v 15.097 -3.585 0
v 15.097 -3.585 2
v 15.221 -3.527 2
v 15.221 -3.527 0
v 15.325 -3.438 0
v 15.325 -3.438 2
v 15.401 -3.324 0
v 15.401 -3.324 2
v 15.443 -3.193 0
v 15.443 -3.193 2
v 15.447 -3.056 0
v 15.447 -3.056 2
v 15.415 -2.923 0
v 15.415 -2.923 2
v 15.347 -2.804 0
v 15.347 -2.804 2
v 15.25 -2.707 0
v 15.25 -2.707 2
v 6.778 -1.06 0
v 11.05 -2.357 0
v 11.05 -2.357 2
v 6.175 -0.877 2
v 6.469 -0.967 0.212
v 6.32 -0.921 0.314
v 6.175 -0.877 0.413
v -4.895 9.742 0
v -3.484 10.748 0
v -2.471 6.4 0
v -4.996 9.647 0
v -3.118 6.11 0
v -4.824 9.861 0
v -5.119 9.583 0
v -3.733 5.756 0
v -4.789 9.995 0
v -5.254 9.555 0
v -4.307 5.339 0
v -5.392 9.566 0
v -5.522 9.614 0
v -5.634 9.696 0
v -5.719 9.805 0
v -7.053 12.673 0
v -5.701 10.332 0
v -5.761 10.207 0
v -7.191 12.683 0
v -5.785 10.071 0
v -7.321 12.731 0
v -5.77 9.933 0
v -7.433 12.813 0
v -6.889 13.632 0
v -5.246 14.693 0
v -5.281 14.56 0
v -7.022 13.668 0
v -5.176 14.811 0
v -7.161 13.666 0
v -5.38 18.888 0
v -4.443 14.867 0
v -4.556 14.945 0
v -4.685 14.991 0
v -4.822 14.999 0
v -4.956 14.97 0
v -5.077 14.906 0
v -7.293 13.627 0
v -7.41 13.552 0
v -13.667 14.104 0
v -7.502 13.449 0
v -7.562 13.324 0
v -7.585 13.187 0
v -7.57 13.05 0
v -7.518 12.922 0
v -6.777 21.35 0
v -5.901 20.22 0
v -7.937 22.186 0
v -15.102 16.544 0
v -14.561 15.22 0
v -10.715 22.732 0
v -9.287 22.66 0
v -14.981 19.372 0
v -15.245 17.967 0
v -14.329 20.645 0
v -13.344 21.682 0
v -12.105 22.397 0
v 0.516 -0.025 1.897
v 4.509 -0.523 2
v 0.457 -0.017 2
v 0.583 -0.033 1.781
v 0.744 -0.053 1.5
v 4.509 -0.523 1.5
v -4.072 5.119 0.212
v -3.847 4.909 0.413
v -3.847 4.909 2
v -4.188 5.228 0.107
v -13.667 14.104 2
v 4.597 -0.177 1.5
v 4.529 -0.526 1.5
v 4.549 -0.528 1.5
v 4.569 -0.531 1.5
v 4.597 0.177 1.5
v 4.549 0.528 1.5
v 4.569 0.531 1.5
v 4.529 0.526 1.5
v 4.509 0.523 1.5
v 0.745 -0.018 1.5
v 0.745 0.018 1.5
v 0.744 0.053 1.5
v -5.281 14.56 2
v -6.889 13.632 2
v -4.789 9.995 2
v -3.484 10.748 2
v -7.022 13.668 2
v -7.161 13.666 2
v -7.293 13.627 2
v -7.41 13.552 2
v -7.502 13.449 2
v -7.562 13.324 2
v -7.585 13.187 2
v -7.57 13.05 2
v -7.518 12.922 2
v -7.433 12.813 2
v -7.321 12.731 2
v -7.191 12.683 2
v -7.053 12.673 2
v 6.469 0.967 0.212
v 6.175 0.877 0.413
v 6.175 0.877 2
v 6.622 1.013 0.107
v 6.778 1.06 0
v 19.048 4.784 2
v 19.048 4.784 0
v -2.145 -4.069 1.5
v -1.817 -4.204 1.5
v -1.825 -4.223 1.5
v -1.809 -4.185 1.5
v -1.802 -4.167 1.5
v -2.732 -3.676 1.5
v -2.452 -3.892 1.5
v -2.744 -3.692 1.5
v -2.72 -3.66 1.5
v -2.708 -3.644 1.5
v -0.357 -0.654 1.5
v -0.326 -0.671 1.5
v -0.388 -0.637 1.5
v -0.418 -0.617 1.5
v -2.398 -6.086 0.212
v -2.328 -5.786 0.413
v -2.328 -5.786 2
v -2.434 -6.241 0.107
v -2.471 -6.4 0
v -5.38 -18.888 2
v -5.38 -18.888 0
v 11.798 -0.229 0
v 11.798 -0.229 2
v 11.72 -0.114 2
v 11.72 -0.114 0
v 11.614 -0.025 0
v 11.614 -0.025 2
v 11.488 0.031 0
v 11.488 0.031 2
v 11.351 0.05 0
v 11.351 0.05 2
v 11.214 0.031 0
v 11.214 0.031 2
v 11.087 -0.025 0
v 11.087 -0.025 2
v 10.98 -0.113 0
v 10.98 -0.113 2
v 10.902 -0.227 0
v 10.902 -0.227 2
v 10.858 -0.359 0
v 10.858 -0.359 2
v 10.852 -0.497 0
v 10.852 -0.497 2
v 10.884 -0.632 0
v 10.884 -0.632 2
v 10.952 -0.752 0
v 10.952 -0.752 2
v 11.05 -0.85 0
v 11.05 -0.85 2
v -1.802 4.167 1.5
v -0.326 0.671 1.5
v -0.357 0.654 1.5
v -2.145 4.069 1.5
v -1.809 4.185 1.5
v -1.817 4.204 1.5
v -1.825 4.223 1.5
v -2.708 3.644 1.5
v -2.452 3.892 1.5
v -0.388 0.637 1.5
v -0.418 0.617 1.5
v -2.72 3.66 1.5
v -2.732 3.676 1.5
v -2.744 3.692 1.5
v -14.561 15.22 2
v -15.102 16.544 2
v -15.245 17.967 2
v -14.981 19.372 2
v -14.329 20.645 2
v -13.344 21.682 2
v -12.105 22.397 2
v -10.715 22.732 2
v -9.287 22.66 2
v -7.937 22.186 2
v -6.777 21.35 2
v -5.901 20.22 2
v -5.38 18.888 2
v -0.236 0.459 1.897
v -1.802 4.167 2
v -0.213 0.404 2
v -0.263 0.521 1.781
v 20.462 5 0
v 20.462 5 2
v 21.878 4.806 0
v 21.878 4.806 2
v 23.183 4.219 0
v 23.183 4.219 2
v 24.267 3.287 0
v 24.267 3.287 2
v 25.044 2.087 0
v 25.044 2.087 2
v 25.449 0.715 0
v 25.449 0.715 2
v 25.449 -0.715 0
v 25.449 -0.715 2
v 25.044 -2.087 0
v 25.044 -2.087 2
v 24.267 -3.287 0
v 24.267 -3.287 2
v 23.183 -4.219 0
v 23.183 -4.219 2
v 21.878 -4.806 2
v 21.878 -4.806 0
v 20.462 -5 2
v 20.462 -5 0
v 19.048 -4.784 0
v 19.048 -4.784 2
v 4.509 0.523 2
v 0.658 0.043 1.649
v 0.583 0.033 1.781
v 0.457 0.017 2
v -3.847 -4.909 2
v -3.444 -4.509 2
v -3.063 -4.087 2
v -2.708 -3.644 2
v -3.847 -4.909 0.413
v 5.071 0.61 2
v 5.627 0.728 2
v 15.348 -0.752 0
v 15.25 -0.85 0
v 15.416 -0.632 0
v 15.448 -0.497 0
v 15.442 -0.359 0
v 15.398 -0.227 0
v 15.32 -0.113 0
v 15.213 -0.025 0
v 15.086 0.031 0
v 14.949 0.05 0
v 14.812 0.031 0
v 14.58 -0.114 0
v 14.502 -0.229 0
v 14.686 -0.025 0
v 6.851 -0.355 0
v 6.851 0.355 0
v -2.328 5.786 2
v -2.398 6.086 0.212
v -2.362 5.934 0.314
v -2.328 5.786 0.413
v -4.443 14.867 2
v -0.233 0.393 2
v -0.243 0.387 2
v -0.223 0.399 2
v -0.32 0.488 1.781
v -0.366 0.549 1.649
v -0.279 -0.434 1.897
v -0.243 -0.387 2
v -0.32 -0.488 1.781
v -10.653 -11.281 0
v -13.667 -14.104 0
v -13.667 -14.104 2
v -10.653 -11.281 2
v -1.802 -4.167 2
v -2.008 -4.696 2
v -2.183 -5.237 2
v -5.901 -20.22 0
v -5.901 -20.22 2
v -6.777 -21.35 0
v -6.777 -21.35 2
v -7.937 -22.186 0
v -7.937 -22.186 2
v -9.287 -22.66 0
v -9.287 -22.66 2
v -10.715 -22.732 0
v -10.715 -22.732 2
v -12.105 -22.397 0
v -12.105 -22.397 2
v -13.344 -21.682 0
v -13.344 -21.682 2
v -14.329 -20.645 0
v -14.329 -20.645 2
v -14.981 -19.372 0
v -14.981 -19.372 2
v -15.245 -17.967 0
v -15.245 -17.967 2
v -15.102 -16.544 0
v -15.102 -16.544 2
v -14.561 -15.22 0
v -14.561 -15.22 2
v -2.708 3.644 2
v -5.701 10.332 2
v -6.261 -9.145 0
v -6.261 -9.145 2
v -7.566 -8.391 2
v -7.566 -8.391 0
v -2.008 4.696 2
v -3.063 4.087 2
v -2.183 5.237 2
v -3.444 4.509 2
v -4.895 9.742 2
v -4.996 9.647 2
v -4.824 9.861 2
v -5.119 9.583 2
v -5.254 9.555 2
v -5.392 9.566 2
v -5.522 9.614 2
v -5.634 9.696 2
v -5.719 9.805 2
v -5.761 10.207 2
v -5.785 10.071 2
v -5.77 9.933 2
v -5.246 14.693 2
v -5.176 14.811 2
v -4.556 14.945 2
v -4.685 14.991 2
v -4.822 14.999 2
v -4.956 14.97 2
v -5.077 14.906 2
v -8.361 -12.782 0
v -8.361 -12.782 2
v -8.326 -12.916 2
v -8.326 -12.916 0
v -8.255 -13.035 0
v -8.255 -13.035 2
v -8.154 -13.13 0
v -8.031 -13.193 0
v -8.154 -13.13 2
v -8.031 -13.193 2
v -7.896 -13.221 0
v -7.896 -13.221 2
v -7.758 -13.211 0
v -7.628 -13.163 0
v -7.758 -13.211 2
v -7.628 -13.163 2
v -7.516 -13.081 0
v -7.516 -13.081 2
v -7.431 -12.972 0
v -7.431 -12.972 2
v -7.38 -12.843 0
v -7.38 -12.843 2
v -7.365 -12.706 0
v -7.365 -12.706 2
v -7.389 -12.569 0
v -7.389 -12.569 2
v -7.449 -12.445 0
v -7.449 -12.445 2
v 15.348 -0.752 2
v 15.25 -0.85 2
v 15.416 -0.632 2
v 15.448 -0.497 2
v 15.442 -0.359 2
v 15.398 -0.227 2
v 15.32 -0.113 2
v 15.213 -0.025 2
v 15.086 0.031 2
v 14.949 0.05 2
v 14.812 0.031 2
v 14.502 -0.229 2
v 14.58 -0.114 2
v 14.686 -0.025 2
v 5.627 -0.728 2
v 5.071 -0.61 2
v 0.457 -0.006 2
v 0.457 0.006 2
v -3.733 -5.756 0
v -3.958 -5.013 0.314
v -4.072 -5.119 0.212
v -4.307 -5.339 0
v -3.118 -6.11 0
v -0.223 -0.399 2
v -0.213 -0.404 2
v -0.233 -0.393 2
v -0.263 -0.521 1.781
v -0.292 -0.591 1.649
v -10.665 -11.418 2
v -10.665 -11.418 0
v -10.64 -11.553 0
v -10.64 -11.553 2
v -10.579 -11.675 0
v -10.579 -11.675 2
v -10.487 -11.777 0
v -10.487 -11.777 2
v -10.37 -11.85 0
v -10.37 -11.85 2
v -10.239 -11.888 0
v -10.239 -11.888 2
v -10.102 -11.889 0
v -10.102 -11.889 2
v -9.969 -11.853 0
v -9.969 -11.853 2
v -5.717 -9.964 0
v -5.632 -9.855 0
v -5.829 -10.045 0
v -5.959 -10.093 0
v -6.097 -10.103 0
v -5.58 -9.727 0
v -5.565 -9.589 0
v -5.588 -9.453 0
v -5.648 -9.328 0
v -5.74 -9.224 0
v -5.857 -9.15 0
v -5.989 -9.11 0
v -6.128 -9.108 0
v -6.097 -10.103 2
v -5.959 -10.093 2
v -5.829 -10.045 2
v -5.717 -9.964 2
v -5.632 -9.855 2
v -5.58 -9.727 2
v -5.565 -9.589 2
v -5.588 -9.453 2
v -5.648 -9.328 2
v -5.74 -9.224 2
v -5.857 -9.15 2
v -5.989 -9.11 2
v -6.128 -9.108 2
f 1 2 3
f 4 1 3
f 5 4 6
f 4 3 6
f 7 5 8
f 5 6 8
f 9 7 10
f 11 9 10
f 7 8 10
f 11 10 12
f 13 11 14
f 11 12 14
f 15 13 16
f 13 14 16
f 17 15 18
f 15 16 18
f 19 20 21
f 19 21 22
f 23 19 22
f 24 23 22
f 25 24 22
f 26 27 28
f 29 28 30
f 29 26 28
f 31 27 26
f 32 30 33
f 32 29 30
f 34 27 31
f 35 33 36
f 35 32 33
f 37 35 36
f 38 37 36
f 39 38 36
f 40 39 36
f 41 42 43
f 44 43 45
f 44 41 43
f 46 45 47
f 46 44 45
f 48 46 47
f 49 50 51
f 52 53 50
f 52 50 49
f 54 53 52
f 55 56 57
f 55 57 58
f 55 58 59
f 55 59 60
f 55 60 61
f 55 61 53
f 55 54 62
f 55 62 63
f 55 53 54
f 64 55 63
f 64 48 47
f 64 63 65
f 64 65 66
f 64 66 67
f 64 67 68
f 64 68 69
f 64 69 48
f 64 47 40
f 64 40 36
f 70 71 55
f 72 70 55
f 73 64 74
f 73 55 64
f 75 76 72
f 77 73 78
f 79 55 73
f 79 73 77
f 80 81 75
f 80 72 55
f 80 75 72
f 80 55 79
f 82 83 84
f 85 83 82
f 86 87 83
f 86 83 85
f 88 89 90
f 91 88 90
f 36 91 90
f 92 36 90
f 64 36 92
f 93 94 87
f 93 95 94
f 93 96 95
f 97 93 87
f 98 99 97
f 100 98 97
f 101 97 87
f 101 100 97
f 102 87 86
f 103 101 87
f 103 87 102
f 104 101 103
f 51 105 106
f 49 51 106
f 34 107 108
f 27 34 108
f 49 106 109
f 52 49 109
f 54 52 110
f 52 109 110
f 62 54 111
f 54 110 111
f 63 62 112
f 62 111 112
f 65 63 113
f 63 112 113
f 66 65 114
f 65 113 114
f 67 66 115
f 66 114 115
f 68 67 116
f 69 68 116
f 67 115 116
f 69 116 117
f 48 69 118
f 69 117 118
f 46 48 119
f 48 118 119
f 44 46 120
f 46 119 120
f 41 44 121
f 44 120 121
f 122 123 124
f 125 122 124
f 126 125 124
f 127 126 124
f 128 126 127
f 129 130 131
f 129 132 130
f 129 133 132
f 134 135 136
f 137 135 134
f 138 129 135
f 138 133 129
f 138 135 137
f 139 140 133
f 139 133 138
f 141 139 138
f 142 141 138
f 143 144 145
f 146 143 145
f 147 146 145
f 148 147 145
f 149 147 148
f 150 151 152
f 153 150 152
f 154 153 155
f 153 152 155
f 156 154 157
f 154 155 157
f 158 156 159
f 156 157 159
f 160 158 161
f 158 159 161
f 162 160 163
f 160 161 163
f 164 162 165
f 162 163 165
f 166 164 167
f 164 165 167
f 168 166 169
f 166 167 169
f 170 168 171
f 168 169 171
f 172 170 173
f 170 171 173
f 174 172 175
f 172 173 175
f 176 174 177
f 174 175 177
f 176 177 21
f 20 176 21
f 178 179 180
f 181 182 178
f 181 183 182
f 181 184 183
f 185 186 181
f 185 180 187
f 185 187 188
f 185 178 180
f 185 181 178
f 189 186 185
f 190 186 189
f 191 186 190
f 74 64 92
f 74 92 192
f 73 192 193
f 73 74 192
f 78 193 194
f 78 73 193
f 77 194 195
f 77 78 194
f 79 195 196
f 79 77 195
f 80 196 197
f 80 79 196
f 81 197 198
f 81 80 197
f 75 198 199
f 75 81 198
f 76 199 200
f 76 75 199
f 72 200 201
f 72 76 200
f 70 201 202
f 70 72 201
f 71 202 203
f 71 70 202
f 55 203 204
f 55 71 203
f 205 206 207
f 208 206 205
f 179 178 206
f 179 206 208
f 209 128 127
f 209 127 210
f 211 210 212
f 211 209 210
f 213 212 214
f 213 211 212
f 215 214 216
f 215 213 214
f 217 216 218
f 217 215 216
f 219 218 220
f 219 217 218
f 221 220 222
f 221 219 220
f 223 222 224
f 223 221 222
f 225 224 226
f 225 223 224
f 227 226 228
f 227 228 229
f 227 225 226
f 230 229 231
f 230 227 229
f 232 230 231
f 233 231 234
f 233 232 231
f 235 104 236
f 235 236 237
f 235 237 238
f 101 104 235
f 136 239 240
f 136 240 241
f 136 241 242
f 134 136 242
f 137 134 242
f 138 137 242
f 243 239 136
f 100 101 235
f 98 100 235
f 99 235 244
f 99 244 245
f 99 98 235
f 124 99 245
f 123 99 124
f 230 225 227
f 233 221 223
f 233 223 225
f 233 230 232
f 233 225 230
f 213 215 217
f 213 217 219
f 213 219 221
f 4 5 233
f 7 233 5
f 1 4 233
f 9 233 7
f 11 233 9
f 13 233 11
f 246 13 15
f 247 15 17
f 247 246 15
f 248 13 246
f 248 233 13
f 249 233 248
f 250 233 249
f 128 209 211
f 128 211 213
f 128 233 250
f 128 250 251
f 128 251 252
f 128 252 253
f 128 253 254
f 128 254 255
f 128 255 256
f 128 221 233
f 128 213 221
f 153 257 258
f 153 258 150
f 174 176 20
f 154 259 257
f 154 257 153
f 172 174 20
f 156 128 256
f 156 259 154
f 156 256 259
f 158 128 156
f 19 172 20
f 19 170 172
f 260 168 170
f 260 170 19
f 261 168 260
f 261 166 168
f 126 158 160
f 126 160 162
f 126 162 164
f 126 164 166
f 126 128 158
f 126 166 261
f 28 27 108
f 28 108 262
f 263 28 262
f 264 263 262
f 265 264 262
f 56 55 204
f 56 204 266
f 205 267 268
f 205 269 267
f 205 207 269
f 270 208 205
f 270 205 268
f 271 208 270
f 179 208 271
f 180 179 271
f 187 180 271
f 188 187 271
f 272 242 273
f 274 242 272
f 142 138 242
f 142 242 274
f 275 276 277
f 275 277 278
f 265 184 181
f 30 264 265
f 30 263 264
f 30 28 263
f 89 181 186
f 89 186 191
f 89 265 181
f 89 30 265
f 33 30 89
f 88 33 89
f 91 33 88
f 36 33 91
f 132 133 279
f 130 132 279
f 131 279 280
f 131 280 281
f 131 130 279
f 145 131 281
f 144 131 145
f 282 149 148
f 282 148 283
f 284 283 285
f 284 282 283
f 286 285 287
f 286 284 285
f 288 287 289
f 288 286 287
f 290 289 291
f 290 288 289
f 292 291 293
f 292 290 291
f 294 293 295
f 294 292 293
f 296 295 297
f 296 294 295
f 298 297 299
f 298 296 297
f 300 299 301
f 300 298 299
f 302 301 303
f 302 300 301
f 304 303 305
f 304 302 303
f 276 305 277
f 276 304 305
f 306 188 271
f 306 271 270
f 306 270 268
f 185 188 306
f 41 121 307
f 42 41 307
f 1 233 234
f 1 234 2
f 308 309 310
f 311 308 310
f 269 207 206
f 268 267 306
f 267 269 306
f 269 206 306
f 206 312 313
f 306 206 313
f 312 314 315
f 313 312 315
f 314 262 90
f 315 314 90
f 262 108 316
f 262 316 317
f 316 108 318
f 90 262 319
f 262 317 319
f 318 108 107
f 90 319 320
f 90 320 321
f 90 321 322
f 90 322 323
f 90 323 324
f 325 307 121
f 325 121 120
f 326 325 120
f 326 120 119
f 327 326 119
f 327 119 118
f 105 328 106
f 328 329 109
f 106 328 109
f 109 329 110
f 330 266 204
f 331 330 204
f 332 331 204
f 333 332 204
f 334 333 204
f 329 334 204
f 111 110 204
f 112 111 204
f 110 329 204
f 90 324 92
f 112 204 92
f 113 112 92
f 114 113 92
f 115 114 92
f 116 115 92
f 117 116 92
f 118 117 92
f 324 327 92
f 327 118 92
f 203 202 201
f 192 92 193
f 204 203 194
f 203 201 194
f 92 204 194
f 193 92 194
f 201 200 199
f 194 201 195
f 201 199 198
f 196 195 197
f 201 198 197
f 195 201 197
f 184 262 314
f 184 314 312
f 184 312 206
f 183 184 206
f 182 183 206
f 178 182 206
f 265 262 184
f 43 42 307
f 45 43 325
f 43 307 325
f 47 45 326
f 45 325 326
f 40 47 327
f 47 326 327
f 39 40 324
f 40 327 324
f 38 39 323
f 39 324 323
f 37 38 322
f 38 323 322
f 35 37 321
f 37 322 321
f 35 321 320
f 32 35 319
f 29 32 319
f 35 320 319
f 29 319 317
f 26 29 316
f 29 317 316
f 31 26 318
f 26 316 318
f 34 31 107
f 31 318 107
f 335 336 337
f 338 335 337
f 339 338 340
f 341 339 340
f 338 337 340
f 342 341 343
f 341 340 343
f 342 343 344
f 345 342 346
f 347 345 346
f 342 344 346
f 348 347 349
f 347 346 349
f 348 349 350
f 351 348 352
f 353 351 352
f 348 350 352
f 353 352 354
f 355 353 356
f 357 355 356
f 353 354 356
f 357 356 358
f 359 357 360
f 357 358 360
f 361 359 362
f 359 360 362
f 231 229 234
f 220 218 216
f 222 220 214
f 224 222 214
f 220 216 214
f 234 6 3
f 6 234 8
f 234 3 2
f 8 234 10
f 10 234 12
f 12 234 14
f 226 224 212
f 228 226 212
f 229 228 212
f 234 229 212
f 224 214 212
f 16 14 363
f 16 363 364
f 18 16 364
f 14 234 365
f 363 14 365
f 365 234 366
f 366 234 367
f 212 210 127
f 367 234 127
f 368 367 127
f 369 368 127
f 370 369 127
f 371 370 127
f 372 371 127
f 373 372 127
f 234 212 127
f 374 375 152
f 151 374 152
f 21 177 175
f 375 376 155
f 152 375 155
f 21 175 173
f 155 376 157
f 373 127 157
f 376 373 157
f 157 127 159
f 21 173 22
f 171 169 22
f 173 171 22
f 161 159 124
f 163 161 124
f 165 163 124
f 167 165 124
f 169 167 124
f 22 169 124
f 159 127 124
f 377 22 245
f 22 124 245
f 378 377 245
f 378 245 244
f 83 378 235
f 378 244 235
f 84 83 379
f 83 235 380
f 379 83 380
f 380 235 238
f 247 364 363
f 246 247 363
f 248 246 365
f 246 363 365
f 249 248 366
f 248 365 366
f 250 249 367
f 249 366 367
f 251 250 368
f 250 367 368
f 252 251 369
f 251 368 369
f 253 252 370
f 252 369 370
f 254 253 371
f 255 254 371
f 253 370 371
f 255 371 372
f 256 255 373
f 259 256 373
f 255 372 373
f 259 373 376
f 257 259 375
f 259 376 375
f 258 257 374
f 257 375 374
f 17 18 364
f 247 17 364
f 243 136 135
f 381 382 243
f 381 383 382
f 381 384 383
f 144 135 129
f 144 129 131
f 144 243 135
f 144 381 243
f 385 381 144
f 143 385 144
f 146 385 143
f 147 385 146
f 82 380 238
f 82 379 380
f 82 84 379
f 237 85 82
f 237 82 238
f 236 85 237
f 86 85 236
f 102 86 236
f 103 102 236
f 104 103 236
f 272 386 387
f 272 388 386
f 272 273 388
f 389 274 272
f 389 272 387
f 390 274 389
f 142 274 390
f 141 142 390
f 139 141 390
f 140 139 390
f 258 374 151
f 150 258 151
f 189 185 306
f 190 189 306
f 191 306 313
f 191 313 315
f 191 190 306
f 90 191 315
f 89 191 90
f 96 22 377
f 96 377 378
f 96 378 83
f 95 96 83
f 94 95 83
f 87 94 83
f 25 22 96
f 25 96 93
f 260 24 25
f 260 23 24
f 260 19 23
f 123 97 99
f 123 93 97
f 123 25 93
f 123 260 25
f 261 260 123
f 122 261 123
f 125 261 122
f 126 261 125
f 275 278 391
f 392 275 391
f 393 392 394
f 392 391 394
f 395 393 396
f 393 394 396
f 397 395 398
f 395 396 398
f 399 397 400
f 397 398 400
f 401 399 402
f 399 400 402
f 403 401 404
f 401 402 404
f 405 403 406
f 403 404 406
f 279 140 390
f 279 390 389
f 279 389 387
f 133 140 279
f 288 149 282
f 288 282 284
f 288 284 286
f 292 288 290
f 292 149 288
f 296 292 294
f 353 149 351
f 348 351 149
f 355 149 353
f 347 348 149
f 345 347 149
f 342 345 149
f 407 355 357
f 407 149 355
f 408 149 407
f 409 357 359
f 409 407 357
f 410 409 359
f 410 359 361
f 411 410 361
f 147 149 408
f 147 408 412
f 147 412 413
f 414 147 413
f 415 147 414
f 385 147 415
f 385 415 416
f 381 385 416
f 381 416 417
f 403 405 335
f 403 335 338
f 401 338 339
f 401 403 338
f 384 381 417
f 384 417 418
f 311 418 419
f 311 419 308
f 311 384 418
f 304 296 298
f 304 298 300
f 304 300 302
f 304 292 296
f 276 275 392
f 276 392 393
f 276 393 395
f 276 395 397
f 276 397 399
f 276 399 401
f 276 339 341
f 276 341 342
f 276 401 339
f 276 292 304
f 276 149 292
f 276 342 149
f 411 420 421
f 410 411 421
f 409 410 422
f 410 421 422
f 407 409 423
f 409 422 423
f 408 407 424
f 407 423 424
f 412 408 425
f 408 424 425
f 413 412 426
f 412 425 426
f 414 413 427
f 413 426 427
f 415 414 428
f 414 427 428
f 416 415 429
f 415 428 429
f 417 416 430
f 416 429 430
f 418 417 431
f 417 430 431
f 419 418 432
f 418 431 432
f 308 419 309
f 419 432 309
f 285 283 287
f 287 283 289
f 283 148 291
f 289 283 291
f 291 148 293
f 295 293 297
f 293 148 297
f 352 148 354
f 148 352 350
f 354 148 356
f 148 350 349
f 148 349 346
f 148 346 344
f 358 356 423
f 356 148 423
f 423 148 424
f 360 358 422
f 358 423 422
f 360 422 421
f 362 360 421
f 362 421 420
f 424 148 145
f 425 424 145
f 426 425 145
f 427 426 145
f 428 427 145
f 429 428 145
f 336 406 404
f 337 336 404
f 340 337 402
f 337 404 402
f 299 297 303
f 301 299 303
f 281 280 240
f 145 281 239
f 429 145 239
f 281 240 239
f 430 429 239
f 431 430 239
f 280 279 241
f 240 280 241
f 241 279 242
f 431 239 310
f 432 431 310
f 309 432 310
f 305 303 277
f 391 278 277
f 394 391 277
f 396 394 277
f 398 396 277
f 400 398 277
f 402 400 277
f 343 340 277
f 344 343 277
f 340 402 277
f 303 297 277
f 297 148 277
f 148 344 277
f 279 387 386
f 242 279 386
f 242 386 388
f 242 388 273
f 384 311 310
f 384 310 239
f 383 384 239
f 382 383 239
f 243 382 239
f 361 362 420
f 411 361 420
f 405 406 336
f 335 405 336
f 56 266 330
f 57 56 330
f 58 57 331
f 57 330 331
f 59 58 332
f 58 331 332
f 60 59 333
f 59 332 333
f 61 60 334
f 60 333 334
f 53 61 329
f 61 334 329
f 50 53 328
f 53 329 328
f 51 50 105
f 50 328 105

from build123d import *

# Parameters (mm, degrees)
EXTRUDE_1_DEPTH     = 2
EXTRUDE_1_2_DEPTH   = 2
EXTRUDE_1_3_DEPTH   = 2
CUT_EXTRUDE_1_DEPTH = 35.234086928


with BuildPart() as part:
    # 草圖1 → 填料-伸長1 (new body)
    with BuildSketch(Plane.XY):
        with BuildLine():
            Line((0.357380647, 0.004961492), (4.50941379, 0.523267787))
            ThreePointArc((4.50941379, 0.523267787), (5.349803134, 0.664770922), (6.175092484, 0.877314741))
            Line((6.175092484, 0.877314741), (19.047808057, 4.784468472))
            ThreePointArc((19.047808057, 4.784468472), (25.5, 0), (19.047808057, -4.784468472))
            Line((19.047808057, -4.784468472), (6.175092484, -0.877314741))
            ThreePointArc((6.175092484, -0.877314741), (5.349803134, -0.664770922), (4.50941379, -0.523267787))
            Line((4.50941379, -0.523267787), (0.357380647, -0.004961492))
            ThreePointArc((0.357380647, -0.004961492), (0.353, 0), (0.357380647, 0.004961492))
        make_face()
    extrude(amount=EXTRUDE_1_DEPTH)


with BuildPart() as body_2:
    # 草圖1 → Extrude 1 2 (new body)
    with BuildSketch(Plane.XY):
        with BuildLine():
            Line((-2.327769389, -5.786444332), (-5.380432788, -18.8881199))
            ThreePointArc((-5.380432788, -18.8881199), (-12.75, -22.083647797), (-13.667375269, -14.103651428))
            Line((-13.667375269, -14.103651428), (-3.847323094, -4.909129591))
            ThreePointArc((-3.847323094, -4.909129591), (-3.250610073, -4.300679958), (-2.707870091, -3.643633005))
            Line((-2.707870091, -3.643633005), (-0.182987102, -0.307019973))
            ThreePointArc((-0.182987102, -0.307019973), (-0.1765, -0.305706968), (-0.174393546, -0.311981465))
            Line((-0.174393546, -0.311981465), (-1.801543699, -4.166900792))
            ThreePointArc((-1.801543699, -4.166900792), (-2.09919306, -4.96545088), (-2.327769389, -5.786444332))
        make_face()
    extrude(amount=EXTRUDE_1_2_DEPTH)


with BuildPart() as body_3:
    # 草圖1 → Extrude 1 3 (new body)
    with BuildSketch(Plane.XY):
        with BuildLine():
            Line((-3.847323094, 4.909129591), (-13.667375269, 14.103651428))
            ThreePointArc((-13.667375269, 14.103651428), (-12.75, 22.083647797), (-5.380432788, 18.8881199))
            Line((-5.380432788, 18.8881199), (-2.327769389, 5.786444332))
            ThreePointArc((-2.327769389, 5.786444332), (-2.09919306, 4.96545088), (-1.801543699, 4.166900792))
            Line((-1.801543699, 4.166900792), (-0.174393546, 0.311981465))
            ThreePointArc((-0.174393546, 0.311981465), (-0.1765, 0.305706968), (-0.182987102, 0.307019973))
            Line((-0.182987102, 0.307019973), (-2.707870091, 3.643633005))
            ThreePointArc((-2.707870091, 3.643633005), (-3.250610073, 4.300679958), (-3.847323094, 4.909129591))
        make_face()
    extrude(amount=EXTRUDE_1_3_DEPTH)


with BuildPart() as cut_extrude_1_tool:
    # 草圖2 → 除料-伸長1 (new, through all)
    with BuildSketch(Plane.XY.offset(2)):
        with BuildLine():
            ThreePointArc((11.798296094, -0.228571429), (11.03056096, -0.065346), (11.05, -0.85))
            Line((11.05, -0.85), (11.05, -2.356956933))
            Line((11.05, -2.356956933), (15.09656548, -3.585179007))
            ThreePointArc((15.09656548, -3.585179007), (15.442536346, -3.193212295), (15.25, -2.707142857))
            Line((15.25, -2.707142857), (15.25, -0.85))
            ThreePointArc((15.25, -0.85), (15.26943904, -0.065346), (14.501703906, -0.228571429))
            Line((14.501703906, -0.228571429), (11.798296094, -0.228571429))
        make_face()
        with BuildLine():
            ThreePointArc((-6.888878407, 13.631887408), (-7.578128224, 13.25639511), (-7.052903289, 12.673129695))
            Line((-7.052903289, 12.673129695), (-5.701199383, 10.331909853))
            ThreePointArc((-5.701199383, 10.331909853), (-5.458689184, 9.585419009), (-4.788878407, 9.994580712))
            Line((-4.788878407, 9.994580712), (-3.48381542, 10.748059178))
            Line((-3.48381542, 10.748059178), (-4.443426643, 14.866598719))
            ThreePointArc((-4.443426643, 14.866598719), (-4.955865206, 14.970234922), (-5.280545514, 14.560458836))
            Line((-5.280545514, 14.560458836), (-6.888878407, 13.631887408))
        make_face()
        with BuildLine():
            ThreePointArc((-6.097096711, -10.103338424), (-5.571871776, -9.520073009), (-6.261121593, -9.144580712))
            Line((-6.261121593, -9.144580712), (-7.56618458, -8.391102245))
            Line((-7.56618458, -8.391102245), (-10.653138837, -11.281419712))
            ThreePointArc((-10.653138837, -11.281419712), (-10.48667114, -11.777022627), (-9.969454486, -11.853315979))
            Line((-9.969454486, -11.853315979), (-8.361121593, -12.781887408))
            ThreePointArc((-8.361121593, -12.781887408), (-7.691310816, -13.19104911), (-7.448800617, -12.444558267))
            Line((-7.448800617, -12.444558267), (-6.097096711, -10.103338424))
        make_face()
    extrude(amount=-CUT_EXTRUDE_1_DEPTH)


with BuildPart() as part_1:
    add(part.part)

    # 除料-伸長1: cut by cut_extrude_1_tool
    add(cut_extrude_1_tool.part, mode=Mode.SUBTRACT)


with BuildPart() as body_2_1:
    add(body_2.part)

    # 除料-伸長1: cut by cut_extrude_1_tool
    add(cut_extrude_1_tool.part, mode=Mode.SUBTRACT)


with BuildPart() as body_3_1:
    add(body_3.part)

    # 除料-伸長1: cut by cut_extrude_1_tool
    add(cut_extrude_1_tool.part, mode=Mode.SUBTRACT)


with BuildPart() as cut_revolve_2_tool:
    # 草圖3 → 除料-旋轉2 (revolve)
    with BuildSketch(Plane(origin=(0, 0, 0), x_dir=(1, 0, 0), z_dir=(0, 1, 0))):
        Polygon((0, -1.5), (4.6, -1.5), (6.86, 0), (0, 0), align=None)
    revolve(axis=Axis((0, 0, -1.706722595), (0, 0, 1)))


with BuildPart() as part_2:
    add(part_1.part)

    # 除料-旋轉2: cut by cut_revolve_2_tool
    add(cut_revolve_2_tool.part, mode=Mode.SUBTRACT)


with BuildPart() as body_2_2:
    add(body_2_1.part)

    # 除料-旋轉2: cut by cut_revolve_2_tool
    add(cut_revolve_2_tool.part, mode=Mode.SUBTRACT)


with BuildPart() as body_3_2:
    add(body_3_1.part)

    # 除料-旋轉2: cut by cut_revolve_2_tool
    add(cut_revolve_2_tool.part, mode=Mode.SUBTRACT)


with BuildPart() as cut_revolve_4_tool:
    # 草圖4 → 除料-旋轉4 (revolve)
    with BuildSketch(Plane(origin=(0, 0, 0), x_dir=(1, 0, 0), z_dir=(0, 1, 0))):
        Polygon((0.353, -2.18), (0.745598183, -1.5), (0.353, -1.5), align=None)
    revolve(axis=Axis((0, 0, -0.874986171), (0, 0, 1)))


with BuildPart() as part_3:
    add(part_2.part)

    # 除料-旋轉4: cut by cut_revolve_4_tool
    add(cut_revolve_4_tool.part, mode=Mode.SUBTRACT)


with BuildPart() as body_2_3:
    add(body_2_2.part)

    # 除料-旋轉4: cut by cut_revolve_4_tool
    add(cut_revolve_4_tool.part, mode=Mode.SUBTRACT)


with BuildPart() as body_3_3:
    add(body_3_2.part)

    # 除料-旋轉4: cut by cut_revolve_4_tool
    add(cut_revolve_4_tool.part, mode=Mode.SUBTRACT)


solid = Compound([part_3.part, body_2_3.part, body_3_3.part])
